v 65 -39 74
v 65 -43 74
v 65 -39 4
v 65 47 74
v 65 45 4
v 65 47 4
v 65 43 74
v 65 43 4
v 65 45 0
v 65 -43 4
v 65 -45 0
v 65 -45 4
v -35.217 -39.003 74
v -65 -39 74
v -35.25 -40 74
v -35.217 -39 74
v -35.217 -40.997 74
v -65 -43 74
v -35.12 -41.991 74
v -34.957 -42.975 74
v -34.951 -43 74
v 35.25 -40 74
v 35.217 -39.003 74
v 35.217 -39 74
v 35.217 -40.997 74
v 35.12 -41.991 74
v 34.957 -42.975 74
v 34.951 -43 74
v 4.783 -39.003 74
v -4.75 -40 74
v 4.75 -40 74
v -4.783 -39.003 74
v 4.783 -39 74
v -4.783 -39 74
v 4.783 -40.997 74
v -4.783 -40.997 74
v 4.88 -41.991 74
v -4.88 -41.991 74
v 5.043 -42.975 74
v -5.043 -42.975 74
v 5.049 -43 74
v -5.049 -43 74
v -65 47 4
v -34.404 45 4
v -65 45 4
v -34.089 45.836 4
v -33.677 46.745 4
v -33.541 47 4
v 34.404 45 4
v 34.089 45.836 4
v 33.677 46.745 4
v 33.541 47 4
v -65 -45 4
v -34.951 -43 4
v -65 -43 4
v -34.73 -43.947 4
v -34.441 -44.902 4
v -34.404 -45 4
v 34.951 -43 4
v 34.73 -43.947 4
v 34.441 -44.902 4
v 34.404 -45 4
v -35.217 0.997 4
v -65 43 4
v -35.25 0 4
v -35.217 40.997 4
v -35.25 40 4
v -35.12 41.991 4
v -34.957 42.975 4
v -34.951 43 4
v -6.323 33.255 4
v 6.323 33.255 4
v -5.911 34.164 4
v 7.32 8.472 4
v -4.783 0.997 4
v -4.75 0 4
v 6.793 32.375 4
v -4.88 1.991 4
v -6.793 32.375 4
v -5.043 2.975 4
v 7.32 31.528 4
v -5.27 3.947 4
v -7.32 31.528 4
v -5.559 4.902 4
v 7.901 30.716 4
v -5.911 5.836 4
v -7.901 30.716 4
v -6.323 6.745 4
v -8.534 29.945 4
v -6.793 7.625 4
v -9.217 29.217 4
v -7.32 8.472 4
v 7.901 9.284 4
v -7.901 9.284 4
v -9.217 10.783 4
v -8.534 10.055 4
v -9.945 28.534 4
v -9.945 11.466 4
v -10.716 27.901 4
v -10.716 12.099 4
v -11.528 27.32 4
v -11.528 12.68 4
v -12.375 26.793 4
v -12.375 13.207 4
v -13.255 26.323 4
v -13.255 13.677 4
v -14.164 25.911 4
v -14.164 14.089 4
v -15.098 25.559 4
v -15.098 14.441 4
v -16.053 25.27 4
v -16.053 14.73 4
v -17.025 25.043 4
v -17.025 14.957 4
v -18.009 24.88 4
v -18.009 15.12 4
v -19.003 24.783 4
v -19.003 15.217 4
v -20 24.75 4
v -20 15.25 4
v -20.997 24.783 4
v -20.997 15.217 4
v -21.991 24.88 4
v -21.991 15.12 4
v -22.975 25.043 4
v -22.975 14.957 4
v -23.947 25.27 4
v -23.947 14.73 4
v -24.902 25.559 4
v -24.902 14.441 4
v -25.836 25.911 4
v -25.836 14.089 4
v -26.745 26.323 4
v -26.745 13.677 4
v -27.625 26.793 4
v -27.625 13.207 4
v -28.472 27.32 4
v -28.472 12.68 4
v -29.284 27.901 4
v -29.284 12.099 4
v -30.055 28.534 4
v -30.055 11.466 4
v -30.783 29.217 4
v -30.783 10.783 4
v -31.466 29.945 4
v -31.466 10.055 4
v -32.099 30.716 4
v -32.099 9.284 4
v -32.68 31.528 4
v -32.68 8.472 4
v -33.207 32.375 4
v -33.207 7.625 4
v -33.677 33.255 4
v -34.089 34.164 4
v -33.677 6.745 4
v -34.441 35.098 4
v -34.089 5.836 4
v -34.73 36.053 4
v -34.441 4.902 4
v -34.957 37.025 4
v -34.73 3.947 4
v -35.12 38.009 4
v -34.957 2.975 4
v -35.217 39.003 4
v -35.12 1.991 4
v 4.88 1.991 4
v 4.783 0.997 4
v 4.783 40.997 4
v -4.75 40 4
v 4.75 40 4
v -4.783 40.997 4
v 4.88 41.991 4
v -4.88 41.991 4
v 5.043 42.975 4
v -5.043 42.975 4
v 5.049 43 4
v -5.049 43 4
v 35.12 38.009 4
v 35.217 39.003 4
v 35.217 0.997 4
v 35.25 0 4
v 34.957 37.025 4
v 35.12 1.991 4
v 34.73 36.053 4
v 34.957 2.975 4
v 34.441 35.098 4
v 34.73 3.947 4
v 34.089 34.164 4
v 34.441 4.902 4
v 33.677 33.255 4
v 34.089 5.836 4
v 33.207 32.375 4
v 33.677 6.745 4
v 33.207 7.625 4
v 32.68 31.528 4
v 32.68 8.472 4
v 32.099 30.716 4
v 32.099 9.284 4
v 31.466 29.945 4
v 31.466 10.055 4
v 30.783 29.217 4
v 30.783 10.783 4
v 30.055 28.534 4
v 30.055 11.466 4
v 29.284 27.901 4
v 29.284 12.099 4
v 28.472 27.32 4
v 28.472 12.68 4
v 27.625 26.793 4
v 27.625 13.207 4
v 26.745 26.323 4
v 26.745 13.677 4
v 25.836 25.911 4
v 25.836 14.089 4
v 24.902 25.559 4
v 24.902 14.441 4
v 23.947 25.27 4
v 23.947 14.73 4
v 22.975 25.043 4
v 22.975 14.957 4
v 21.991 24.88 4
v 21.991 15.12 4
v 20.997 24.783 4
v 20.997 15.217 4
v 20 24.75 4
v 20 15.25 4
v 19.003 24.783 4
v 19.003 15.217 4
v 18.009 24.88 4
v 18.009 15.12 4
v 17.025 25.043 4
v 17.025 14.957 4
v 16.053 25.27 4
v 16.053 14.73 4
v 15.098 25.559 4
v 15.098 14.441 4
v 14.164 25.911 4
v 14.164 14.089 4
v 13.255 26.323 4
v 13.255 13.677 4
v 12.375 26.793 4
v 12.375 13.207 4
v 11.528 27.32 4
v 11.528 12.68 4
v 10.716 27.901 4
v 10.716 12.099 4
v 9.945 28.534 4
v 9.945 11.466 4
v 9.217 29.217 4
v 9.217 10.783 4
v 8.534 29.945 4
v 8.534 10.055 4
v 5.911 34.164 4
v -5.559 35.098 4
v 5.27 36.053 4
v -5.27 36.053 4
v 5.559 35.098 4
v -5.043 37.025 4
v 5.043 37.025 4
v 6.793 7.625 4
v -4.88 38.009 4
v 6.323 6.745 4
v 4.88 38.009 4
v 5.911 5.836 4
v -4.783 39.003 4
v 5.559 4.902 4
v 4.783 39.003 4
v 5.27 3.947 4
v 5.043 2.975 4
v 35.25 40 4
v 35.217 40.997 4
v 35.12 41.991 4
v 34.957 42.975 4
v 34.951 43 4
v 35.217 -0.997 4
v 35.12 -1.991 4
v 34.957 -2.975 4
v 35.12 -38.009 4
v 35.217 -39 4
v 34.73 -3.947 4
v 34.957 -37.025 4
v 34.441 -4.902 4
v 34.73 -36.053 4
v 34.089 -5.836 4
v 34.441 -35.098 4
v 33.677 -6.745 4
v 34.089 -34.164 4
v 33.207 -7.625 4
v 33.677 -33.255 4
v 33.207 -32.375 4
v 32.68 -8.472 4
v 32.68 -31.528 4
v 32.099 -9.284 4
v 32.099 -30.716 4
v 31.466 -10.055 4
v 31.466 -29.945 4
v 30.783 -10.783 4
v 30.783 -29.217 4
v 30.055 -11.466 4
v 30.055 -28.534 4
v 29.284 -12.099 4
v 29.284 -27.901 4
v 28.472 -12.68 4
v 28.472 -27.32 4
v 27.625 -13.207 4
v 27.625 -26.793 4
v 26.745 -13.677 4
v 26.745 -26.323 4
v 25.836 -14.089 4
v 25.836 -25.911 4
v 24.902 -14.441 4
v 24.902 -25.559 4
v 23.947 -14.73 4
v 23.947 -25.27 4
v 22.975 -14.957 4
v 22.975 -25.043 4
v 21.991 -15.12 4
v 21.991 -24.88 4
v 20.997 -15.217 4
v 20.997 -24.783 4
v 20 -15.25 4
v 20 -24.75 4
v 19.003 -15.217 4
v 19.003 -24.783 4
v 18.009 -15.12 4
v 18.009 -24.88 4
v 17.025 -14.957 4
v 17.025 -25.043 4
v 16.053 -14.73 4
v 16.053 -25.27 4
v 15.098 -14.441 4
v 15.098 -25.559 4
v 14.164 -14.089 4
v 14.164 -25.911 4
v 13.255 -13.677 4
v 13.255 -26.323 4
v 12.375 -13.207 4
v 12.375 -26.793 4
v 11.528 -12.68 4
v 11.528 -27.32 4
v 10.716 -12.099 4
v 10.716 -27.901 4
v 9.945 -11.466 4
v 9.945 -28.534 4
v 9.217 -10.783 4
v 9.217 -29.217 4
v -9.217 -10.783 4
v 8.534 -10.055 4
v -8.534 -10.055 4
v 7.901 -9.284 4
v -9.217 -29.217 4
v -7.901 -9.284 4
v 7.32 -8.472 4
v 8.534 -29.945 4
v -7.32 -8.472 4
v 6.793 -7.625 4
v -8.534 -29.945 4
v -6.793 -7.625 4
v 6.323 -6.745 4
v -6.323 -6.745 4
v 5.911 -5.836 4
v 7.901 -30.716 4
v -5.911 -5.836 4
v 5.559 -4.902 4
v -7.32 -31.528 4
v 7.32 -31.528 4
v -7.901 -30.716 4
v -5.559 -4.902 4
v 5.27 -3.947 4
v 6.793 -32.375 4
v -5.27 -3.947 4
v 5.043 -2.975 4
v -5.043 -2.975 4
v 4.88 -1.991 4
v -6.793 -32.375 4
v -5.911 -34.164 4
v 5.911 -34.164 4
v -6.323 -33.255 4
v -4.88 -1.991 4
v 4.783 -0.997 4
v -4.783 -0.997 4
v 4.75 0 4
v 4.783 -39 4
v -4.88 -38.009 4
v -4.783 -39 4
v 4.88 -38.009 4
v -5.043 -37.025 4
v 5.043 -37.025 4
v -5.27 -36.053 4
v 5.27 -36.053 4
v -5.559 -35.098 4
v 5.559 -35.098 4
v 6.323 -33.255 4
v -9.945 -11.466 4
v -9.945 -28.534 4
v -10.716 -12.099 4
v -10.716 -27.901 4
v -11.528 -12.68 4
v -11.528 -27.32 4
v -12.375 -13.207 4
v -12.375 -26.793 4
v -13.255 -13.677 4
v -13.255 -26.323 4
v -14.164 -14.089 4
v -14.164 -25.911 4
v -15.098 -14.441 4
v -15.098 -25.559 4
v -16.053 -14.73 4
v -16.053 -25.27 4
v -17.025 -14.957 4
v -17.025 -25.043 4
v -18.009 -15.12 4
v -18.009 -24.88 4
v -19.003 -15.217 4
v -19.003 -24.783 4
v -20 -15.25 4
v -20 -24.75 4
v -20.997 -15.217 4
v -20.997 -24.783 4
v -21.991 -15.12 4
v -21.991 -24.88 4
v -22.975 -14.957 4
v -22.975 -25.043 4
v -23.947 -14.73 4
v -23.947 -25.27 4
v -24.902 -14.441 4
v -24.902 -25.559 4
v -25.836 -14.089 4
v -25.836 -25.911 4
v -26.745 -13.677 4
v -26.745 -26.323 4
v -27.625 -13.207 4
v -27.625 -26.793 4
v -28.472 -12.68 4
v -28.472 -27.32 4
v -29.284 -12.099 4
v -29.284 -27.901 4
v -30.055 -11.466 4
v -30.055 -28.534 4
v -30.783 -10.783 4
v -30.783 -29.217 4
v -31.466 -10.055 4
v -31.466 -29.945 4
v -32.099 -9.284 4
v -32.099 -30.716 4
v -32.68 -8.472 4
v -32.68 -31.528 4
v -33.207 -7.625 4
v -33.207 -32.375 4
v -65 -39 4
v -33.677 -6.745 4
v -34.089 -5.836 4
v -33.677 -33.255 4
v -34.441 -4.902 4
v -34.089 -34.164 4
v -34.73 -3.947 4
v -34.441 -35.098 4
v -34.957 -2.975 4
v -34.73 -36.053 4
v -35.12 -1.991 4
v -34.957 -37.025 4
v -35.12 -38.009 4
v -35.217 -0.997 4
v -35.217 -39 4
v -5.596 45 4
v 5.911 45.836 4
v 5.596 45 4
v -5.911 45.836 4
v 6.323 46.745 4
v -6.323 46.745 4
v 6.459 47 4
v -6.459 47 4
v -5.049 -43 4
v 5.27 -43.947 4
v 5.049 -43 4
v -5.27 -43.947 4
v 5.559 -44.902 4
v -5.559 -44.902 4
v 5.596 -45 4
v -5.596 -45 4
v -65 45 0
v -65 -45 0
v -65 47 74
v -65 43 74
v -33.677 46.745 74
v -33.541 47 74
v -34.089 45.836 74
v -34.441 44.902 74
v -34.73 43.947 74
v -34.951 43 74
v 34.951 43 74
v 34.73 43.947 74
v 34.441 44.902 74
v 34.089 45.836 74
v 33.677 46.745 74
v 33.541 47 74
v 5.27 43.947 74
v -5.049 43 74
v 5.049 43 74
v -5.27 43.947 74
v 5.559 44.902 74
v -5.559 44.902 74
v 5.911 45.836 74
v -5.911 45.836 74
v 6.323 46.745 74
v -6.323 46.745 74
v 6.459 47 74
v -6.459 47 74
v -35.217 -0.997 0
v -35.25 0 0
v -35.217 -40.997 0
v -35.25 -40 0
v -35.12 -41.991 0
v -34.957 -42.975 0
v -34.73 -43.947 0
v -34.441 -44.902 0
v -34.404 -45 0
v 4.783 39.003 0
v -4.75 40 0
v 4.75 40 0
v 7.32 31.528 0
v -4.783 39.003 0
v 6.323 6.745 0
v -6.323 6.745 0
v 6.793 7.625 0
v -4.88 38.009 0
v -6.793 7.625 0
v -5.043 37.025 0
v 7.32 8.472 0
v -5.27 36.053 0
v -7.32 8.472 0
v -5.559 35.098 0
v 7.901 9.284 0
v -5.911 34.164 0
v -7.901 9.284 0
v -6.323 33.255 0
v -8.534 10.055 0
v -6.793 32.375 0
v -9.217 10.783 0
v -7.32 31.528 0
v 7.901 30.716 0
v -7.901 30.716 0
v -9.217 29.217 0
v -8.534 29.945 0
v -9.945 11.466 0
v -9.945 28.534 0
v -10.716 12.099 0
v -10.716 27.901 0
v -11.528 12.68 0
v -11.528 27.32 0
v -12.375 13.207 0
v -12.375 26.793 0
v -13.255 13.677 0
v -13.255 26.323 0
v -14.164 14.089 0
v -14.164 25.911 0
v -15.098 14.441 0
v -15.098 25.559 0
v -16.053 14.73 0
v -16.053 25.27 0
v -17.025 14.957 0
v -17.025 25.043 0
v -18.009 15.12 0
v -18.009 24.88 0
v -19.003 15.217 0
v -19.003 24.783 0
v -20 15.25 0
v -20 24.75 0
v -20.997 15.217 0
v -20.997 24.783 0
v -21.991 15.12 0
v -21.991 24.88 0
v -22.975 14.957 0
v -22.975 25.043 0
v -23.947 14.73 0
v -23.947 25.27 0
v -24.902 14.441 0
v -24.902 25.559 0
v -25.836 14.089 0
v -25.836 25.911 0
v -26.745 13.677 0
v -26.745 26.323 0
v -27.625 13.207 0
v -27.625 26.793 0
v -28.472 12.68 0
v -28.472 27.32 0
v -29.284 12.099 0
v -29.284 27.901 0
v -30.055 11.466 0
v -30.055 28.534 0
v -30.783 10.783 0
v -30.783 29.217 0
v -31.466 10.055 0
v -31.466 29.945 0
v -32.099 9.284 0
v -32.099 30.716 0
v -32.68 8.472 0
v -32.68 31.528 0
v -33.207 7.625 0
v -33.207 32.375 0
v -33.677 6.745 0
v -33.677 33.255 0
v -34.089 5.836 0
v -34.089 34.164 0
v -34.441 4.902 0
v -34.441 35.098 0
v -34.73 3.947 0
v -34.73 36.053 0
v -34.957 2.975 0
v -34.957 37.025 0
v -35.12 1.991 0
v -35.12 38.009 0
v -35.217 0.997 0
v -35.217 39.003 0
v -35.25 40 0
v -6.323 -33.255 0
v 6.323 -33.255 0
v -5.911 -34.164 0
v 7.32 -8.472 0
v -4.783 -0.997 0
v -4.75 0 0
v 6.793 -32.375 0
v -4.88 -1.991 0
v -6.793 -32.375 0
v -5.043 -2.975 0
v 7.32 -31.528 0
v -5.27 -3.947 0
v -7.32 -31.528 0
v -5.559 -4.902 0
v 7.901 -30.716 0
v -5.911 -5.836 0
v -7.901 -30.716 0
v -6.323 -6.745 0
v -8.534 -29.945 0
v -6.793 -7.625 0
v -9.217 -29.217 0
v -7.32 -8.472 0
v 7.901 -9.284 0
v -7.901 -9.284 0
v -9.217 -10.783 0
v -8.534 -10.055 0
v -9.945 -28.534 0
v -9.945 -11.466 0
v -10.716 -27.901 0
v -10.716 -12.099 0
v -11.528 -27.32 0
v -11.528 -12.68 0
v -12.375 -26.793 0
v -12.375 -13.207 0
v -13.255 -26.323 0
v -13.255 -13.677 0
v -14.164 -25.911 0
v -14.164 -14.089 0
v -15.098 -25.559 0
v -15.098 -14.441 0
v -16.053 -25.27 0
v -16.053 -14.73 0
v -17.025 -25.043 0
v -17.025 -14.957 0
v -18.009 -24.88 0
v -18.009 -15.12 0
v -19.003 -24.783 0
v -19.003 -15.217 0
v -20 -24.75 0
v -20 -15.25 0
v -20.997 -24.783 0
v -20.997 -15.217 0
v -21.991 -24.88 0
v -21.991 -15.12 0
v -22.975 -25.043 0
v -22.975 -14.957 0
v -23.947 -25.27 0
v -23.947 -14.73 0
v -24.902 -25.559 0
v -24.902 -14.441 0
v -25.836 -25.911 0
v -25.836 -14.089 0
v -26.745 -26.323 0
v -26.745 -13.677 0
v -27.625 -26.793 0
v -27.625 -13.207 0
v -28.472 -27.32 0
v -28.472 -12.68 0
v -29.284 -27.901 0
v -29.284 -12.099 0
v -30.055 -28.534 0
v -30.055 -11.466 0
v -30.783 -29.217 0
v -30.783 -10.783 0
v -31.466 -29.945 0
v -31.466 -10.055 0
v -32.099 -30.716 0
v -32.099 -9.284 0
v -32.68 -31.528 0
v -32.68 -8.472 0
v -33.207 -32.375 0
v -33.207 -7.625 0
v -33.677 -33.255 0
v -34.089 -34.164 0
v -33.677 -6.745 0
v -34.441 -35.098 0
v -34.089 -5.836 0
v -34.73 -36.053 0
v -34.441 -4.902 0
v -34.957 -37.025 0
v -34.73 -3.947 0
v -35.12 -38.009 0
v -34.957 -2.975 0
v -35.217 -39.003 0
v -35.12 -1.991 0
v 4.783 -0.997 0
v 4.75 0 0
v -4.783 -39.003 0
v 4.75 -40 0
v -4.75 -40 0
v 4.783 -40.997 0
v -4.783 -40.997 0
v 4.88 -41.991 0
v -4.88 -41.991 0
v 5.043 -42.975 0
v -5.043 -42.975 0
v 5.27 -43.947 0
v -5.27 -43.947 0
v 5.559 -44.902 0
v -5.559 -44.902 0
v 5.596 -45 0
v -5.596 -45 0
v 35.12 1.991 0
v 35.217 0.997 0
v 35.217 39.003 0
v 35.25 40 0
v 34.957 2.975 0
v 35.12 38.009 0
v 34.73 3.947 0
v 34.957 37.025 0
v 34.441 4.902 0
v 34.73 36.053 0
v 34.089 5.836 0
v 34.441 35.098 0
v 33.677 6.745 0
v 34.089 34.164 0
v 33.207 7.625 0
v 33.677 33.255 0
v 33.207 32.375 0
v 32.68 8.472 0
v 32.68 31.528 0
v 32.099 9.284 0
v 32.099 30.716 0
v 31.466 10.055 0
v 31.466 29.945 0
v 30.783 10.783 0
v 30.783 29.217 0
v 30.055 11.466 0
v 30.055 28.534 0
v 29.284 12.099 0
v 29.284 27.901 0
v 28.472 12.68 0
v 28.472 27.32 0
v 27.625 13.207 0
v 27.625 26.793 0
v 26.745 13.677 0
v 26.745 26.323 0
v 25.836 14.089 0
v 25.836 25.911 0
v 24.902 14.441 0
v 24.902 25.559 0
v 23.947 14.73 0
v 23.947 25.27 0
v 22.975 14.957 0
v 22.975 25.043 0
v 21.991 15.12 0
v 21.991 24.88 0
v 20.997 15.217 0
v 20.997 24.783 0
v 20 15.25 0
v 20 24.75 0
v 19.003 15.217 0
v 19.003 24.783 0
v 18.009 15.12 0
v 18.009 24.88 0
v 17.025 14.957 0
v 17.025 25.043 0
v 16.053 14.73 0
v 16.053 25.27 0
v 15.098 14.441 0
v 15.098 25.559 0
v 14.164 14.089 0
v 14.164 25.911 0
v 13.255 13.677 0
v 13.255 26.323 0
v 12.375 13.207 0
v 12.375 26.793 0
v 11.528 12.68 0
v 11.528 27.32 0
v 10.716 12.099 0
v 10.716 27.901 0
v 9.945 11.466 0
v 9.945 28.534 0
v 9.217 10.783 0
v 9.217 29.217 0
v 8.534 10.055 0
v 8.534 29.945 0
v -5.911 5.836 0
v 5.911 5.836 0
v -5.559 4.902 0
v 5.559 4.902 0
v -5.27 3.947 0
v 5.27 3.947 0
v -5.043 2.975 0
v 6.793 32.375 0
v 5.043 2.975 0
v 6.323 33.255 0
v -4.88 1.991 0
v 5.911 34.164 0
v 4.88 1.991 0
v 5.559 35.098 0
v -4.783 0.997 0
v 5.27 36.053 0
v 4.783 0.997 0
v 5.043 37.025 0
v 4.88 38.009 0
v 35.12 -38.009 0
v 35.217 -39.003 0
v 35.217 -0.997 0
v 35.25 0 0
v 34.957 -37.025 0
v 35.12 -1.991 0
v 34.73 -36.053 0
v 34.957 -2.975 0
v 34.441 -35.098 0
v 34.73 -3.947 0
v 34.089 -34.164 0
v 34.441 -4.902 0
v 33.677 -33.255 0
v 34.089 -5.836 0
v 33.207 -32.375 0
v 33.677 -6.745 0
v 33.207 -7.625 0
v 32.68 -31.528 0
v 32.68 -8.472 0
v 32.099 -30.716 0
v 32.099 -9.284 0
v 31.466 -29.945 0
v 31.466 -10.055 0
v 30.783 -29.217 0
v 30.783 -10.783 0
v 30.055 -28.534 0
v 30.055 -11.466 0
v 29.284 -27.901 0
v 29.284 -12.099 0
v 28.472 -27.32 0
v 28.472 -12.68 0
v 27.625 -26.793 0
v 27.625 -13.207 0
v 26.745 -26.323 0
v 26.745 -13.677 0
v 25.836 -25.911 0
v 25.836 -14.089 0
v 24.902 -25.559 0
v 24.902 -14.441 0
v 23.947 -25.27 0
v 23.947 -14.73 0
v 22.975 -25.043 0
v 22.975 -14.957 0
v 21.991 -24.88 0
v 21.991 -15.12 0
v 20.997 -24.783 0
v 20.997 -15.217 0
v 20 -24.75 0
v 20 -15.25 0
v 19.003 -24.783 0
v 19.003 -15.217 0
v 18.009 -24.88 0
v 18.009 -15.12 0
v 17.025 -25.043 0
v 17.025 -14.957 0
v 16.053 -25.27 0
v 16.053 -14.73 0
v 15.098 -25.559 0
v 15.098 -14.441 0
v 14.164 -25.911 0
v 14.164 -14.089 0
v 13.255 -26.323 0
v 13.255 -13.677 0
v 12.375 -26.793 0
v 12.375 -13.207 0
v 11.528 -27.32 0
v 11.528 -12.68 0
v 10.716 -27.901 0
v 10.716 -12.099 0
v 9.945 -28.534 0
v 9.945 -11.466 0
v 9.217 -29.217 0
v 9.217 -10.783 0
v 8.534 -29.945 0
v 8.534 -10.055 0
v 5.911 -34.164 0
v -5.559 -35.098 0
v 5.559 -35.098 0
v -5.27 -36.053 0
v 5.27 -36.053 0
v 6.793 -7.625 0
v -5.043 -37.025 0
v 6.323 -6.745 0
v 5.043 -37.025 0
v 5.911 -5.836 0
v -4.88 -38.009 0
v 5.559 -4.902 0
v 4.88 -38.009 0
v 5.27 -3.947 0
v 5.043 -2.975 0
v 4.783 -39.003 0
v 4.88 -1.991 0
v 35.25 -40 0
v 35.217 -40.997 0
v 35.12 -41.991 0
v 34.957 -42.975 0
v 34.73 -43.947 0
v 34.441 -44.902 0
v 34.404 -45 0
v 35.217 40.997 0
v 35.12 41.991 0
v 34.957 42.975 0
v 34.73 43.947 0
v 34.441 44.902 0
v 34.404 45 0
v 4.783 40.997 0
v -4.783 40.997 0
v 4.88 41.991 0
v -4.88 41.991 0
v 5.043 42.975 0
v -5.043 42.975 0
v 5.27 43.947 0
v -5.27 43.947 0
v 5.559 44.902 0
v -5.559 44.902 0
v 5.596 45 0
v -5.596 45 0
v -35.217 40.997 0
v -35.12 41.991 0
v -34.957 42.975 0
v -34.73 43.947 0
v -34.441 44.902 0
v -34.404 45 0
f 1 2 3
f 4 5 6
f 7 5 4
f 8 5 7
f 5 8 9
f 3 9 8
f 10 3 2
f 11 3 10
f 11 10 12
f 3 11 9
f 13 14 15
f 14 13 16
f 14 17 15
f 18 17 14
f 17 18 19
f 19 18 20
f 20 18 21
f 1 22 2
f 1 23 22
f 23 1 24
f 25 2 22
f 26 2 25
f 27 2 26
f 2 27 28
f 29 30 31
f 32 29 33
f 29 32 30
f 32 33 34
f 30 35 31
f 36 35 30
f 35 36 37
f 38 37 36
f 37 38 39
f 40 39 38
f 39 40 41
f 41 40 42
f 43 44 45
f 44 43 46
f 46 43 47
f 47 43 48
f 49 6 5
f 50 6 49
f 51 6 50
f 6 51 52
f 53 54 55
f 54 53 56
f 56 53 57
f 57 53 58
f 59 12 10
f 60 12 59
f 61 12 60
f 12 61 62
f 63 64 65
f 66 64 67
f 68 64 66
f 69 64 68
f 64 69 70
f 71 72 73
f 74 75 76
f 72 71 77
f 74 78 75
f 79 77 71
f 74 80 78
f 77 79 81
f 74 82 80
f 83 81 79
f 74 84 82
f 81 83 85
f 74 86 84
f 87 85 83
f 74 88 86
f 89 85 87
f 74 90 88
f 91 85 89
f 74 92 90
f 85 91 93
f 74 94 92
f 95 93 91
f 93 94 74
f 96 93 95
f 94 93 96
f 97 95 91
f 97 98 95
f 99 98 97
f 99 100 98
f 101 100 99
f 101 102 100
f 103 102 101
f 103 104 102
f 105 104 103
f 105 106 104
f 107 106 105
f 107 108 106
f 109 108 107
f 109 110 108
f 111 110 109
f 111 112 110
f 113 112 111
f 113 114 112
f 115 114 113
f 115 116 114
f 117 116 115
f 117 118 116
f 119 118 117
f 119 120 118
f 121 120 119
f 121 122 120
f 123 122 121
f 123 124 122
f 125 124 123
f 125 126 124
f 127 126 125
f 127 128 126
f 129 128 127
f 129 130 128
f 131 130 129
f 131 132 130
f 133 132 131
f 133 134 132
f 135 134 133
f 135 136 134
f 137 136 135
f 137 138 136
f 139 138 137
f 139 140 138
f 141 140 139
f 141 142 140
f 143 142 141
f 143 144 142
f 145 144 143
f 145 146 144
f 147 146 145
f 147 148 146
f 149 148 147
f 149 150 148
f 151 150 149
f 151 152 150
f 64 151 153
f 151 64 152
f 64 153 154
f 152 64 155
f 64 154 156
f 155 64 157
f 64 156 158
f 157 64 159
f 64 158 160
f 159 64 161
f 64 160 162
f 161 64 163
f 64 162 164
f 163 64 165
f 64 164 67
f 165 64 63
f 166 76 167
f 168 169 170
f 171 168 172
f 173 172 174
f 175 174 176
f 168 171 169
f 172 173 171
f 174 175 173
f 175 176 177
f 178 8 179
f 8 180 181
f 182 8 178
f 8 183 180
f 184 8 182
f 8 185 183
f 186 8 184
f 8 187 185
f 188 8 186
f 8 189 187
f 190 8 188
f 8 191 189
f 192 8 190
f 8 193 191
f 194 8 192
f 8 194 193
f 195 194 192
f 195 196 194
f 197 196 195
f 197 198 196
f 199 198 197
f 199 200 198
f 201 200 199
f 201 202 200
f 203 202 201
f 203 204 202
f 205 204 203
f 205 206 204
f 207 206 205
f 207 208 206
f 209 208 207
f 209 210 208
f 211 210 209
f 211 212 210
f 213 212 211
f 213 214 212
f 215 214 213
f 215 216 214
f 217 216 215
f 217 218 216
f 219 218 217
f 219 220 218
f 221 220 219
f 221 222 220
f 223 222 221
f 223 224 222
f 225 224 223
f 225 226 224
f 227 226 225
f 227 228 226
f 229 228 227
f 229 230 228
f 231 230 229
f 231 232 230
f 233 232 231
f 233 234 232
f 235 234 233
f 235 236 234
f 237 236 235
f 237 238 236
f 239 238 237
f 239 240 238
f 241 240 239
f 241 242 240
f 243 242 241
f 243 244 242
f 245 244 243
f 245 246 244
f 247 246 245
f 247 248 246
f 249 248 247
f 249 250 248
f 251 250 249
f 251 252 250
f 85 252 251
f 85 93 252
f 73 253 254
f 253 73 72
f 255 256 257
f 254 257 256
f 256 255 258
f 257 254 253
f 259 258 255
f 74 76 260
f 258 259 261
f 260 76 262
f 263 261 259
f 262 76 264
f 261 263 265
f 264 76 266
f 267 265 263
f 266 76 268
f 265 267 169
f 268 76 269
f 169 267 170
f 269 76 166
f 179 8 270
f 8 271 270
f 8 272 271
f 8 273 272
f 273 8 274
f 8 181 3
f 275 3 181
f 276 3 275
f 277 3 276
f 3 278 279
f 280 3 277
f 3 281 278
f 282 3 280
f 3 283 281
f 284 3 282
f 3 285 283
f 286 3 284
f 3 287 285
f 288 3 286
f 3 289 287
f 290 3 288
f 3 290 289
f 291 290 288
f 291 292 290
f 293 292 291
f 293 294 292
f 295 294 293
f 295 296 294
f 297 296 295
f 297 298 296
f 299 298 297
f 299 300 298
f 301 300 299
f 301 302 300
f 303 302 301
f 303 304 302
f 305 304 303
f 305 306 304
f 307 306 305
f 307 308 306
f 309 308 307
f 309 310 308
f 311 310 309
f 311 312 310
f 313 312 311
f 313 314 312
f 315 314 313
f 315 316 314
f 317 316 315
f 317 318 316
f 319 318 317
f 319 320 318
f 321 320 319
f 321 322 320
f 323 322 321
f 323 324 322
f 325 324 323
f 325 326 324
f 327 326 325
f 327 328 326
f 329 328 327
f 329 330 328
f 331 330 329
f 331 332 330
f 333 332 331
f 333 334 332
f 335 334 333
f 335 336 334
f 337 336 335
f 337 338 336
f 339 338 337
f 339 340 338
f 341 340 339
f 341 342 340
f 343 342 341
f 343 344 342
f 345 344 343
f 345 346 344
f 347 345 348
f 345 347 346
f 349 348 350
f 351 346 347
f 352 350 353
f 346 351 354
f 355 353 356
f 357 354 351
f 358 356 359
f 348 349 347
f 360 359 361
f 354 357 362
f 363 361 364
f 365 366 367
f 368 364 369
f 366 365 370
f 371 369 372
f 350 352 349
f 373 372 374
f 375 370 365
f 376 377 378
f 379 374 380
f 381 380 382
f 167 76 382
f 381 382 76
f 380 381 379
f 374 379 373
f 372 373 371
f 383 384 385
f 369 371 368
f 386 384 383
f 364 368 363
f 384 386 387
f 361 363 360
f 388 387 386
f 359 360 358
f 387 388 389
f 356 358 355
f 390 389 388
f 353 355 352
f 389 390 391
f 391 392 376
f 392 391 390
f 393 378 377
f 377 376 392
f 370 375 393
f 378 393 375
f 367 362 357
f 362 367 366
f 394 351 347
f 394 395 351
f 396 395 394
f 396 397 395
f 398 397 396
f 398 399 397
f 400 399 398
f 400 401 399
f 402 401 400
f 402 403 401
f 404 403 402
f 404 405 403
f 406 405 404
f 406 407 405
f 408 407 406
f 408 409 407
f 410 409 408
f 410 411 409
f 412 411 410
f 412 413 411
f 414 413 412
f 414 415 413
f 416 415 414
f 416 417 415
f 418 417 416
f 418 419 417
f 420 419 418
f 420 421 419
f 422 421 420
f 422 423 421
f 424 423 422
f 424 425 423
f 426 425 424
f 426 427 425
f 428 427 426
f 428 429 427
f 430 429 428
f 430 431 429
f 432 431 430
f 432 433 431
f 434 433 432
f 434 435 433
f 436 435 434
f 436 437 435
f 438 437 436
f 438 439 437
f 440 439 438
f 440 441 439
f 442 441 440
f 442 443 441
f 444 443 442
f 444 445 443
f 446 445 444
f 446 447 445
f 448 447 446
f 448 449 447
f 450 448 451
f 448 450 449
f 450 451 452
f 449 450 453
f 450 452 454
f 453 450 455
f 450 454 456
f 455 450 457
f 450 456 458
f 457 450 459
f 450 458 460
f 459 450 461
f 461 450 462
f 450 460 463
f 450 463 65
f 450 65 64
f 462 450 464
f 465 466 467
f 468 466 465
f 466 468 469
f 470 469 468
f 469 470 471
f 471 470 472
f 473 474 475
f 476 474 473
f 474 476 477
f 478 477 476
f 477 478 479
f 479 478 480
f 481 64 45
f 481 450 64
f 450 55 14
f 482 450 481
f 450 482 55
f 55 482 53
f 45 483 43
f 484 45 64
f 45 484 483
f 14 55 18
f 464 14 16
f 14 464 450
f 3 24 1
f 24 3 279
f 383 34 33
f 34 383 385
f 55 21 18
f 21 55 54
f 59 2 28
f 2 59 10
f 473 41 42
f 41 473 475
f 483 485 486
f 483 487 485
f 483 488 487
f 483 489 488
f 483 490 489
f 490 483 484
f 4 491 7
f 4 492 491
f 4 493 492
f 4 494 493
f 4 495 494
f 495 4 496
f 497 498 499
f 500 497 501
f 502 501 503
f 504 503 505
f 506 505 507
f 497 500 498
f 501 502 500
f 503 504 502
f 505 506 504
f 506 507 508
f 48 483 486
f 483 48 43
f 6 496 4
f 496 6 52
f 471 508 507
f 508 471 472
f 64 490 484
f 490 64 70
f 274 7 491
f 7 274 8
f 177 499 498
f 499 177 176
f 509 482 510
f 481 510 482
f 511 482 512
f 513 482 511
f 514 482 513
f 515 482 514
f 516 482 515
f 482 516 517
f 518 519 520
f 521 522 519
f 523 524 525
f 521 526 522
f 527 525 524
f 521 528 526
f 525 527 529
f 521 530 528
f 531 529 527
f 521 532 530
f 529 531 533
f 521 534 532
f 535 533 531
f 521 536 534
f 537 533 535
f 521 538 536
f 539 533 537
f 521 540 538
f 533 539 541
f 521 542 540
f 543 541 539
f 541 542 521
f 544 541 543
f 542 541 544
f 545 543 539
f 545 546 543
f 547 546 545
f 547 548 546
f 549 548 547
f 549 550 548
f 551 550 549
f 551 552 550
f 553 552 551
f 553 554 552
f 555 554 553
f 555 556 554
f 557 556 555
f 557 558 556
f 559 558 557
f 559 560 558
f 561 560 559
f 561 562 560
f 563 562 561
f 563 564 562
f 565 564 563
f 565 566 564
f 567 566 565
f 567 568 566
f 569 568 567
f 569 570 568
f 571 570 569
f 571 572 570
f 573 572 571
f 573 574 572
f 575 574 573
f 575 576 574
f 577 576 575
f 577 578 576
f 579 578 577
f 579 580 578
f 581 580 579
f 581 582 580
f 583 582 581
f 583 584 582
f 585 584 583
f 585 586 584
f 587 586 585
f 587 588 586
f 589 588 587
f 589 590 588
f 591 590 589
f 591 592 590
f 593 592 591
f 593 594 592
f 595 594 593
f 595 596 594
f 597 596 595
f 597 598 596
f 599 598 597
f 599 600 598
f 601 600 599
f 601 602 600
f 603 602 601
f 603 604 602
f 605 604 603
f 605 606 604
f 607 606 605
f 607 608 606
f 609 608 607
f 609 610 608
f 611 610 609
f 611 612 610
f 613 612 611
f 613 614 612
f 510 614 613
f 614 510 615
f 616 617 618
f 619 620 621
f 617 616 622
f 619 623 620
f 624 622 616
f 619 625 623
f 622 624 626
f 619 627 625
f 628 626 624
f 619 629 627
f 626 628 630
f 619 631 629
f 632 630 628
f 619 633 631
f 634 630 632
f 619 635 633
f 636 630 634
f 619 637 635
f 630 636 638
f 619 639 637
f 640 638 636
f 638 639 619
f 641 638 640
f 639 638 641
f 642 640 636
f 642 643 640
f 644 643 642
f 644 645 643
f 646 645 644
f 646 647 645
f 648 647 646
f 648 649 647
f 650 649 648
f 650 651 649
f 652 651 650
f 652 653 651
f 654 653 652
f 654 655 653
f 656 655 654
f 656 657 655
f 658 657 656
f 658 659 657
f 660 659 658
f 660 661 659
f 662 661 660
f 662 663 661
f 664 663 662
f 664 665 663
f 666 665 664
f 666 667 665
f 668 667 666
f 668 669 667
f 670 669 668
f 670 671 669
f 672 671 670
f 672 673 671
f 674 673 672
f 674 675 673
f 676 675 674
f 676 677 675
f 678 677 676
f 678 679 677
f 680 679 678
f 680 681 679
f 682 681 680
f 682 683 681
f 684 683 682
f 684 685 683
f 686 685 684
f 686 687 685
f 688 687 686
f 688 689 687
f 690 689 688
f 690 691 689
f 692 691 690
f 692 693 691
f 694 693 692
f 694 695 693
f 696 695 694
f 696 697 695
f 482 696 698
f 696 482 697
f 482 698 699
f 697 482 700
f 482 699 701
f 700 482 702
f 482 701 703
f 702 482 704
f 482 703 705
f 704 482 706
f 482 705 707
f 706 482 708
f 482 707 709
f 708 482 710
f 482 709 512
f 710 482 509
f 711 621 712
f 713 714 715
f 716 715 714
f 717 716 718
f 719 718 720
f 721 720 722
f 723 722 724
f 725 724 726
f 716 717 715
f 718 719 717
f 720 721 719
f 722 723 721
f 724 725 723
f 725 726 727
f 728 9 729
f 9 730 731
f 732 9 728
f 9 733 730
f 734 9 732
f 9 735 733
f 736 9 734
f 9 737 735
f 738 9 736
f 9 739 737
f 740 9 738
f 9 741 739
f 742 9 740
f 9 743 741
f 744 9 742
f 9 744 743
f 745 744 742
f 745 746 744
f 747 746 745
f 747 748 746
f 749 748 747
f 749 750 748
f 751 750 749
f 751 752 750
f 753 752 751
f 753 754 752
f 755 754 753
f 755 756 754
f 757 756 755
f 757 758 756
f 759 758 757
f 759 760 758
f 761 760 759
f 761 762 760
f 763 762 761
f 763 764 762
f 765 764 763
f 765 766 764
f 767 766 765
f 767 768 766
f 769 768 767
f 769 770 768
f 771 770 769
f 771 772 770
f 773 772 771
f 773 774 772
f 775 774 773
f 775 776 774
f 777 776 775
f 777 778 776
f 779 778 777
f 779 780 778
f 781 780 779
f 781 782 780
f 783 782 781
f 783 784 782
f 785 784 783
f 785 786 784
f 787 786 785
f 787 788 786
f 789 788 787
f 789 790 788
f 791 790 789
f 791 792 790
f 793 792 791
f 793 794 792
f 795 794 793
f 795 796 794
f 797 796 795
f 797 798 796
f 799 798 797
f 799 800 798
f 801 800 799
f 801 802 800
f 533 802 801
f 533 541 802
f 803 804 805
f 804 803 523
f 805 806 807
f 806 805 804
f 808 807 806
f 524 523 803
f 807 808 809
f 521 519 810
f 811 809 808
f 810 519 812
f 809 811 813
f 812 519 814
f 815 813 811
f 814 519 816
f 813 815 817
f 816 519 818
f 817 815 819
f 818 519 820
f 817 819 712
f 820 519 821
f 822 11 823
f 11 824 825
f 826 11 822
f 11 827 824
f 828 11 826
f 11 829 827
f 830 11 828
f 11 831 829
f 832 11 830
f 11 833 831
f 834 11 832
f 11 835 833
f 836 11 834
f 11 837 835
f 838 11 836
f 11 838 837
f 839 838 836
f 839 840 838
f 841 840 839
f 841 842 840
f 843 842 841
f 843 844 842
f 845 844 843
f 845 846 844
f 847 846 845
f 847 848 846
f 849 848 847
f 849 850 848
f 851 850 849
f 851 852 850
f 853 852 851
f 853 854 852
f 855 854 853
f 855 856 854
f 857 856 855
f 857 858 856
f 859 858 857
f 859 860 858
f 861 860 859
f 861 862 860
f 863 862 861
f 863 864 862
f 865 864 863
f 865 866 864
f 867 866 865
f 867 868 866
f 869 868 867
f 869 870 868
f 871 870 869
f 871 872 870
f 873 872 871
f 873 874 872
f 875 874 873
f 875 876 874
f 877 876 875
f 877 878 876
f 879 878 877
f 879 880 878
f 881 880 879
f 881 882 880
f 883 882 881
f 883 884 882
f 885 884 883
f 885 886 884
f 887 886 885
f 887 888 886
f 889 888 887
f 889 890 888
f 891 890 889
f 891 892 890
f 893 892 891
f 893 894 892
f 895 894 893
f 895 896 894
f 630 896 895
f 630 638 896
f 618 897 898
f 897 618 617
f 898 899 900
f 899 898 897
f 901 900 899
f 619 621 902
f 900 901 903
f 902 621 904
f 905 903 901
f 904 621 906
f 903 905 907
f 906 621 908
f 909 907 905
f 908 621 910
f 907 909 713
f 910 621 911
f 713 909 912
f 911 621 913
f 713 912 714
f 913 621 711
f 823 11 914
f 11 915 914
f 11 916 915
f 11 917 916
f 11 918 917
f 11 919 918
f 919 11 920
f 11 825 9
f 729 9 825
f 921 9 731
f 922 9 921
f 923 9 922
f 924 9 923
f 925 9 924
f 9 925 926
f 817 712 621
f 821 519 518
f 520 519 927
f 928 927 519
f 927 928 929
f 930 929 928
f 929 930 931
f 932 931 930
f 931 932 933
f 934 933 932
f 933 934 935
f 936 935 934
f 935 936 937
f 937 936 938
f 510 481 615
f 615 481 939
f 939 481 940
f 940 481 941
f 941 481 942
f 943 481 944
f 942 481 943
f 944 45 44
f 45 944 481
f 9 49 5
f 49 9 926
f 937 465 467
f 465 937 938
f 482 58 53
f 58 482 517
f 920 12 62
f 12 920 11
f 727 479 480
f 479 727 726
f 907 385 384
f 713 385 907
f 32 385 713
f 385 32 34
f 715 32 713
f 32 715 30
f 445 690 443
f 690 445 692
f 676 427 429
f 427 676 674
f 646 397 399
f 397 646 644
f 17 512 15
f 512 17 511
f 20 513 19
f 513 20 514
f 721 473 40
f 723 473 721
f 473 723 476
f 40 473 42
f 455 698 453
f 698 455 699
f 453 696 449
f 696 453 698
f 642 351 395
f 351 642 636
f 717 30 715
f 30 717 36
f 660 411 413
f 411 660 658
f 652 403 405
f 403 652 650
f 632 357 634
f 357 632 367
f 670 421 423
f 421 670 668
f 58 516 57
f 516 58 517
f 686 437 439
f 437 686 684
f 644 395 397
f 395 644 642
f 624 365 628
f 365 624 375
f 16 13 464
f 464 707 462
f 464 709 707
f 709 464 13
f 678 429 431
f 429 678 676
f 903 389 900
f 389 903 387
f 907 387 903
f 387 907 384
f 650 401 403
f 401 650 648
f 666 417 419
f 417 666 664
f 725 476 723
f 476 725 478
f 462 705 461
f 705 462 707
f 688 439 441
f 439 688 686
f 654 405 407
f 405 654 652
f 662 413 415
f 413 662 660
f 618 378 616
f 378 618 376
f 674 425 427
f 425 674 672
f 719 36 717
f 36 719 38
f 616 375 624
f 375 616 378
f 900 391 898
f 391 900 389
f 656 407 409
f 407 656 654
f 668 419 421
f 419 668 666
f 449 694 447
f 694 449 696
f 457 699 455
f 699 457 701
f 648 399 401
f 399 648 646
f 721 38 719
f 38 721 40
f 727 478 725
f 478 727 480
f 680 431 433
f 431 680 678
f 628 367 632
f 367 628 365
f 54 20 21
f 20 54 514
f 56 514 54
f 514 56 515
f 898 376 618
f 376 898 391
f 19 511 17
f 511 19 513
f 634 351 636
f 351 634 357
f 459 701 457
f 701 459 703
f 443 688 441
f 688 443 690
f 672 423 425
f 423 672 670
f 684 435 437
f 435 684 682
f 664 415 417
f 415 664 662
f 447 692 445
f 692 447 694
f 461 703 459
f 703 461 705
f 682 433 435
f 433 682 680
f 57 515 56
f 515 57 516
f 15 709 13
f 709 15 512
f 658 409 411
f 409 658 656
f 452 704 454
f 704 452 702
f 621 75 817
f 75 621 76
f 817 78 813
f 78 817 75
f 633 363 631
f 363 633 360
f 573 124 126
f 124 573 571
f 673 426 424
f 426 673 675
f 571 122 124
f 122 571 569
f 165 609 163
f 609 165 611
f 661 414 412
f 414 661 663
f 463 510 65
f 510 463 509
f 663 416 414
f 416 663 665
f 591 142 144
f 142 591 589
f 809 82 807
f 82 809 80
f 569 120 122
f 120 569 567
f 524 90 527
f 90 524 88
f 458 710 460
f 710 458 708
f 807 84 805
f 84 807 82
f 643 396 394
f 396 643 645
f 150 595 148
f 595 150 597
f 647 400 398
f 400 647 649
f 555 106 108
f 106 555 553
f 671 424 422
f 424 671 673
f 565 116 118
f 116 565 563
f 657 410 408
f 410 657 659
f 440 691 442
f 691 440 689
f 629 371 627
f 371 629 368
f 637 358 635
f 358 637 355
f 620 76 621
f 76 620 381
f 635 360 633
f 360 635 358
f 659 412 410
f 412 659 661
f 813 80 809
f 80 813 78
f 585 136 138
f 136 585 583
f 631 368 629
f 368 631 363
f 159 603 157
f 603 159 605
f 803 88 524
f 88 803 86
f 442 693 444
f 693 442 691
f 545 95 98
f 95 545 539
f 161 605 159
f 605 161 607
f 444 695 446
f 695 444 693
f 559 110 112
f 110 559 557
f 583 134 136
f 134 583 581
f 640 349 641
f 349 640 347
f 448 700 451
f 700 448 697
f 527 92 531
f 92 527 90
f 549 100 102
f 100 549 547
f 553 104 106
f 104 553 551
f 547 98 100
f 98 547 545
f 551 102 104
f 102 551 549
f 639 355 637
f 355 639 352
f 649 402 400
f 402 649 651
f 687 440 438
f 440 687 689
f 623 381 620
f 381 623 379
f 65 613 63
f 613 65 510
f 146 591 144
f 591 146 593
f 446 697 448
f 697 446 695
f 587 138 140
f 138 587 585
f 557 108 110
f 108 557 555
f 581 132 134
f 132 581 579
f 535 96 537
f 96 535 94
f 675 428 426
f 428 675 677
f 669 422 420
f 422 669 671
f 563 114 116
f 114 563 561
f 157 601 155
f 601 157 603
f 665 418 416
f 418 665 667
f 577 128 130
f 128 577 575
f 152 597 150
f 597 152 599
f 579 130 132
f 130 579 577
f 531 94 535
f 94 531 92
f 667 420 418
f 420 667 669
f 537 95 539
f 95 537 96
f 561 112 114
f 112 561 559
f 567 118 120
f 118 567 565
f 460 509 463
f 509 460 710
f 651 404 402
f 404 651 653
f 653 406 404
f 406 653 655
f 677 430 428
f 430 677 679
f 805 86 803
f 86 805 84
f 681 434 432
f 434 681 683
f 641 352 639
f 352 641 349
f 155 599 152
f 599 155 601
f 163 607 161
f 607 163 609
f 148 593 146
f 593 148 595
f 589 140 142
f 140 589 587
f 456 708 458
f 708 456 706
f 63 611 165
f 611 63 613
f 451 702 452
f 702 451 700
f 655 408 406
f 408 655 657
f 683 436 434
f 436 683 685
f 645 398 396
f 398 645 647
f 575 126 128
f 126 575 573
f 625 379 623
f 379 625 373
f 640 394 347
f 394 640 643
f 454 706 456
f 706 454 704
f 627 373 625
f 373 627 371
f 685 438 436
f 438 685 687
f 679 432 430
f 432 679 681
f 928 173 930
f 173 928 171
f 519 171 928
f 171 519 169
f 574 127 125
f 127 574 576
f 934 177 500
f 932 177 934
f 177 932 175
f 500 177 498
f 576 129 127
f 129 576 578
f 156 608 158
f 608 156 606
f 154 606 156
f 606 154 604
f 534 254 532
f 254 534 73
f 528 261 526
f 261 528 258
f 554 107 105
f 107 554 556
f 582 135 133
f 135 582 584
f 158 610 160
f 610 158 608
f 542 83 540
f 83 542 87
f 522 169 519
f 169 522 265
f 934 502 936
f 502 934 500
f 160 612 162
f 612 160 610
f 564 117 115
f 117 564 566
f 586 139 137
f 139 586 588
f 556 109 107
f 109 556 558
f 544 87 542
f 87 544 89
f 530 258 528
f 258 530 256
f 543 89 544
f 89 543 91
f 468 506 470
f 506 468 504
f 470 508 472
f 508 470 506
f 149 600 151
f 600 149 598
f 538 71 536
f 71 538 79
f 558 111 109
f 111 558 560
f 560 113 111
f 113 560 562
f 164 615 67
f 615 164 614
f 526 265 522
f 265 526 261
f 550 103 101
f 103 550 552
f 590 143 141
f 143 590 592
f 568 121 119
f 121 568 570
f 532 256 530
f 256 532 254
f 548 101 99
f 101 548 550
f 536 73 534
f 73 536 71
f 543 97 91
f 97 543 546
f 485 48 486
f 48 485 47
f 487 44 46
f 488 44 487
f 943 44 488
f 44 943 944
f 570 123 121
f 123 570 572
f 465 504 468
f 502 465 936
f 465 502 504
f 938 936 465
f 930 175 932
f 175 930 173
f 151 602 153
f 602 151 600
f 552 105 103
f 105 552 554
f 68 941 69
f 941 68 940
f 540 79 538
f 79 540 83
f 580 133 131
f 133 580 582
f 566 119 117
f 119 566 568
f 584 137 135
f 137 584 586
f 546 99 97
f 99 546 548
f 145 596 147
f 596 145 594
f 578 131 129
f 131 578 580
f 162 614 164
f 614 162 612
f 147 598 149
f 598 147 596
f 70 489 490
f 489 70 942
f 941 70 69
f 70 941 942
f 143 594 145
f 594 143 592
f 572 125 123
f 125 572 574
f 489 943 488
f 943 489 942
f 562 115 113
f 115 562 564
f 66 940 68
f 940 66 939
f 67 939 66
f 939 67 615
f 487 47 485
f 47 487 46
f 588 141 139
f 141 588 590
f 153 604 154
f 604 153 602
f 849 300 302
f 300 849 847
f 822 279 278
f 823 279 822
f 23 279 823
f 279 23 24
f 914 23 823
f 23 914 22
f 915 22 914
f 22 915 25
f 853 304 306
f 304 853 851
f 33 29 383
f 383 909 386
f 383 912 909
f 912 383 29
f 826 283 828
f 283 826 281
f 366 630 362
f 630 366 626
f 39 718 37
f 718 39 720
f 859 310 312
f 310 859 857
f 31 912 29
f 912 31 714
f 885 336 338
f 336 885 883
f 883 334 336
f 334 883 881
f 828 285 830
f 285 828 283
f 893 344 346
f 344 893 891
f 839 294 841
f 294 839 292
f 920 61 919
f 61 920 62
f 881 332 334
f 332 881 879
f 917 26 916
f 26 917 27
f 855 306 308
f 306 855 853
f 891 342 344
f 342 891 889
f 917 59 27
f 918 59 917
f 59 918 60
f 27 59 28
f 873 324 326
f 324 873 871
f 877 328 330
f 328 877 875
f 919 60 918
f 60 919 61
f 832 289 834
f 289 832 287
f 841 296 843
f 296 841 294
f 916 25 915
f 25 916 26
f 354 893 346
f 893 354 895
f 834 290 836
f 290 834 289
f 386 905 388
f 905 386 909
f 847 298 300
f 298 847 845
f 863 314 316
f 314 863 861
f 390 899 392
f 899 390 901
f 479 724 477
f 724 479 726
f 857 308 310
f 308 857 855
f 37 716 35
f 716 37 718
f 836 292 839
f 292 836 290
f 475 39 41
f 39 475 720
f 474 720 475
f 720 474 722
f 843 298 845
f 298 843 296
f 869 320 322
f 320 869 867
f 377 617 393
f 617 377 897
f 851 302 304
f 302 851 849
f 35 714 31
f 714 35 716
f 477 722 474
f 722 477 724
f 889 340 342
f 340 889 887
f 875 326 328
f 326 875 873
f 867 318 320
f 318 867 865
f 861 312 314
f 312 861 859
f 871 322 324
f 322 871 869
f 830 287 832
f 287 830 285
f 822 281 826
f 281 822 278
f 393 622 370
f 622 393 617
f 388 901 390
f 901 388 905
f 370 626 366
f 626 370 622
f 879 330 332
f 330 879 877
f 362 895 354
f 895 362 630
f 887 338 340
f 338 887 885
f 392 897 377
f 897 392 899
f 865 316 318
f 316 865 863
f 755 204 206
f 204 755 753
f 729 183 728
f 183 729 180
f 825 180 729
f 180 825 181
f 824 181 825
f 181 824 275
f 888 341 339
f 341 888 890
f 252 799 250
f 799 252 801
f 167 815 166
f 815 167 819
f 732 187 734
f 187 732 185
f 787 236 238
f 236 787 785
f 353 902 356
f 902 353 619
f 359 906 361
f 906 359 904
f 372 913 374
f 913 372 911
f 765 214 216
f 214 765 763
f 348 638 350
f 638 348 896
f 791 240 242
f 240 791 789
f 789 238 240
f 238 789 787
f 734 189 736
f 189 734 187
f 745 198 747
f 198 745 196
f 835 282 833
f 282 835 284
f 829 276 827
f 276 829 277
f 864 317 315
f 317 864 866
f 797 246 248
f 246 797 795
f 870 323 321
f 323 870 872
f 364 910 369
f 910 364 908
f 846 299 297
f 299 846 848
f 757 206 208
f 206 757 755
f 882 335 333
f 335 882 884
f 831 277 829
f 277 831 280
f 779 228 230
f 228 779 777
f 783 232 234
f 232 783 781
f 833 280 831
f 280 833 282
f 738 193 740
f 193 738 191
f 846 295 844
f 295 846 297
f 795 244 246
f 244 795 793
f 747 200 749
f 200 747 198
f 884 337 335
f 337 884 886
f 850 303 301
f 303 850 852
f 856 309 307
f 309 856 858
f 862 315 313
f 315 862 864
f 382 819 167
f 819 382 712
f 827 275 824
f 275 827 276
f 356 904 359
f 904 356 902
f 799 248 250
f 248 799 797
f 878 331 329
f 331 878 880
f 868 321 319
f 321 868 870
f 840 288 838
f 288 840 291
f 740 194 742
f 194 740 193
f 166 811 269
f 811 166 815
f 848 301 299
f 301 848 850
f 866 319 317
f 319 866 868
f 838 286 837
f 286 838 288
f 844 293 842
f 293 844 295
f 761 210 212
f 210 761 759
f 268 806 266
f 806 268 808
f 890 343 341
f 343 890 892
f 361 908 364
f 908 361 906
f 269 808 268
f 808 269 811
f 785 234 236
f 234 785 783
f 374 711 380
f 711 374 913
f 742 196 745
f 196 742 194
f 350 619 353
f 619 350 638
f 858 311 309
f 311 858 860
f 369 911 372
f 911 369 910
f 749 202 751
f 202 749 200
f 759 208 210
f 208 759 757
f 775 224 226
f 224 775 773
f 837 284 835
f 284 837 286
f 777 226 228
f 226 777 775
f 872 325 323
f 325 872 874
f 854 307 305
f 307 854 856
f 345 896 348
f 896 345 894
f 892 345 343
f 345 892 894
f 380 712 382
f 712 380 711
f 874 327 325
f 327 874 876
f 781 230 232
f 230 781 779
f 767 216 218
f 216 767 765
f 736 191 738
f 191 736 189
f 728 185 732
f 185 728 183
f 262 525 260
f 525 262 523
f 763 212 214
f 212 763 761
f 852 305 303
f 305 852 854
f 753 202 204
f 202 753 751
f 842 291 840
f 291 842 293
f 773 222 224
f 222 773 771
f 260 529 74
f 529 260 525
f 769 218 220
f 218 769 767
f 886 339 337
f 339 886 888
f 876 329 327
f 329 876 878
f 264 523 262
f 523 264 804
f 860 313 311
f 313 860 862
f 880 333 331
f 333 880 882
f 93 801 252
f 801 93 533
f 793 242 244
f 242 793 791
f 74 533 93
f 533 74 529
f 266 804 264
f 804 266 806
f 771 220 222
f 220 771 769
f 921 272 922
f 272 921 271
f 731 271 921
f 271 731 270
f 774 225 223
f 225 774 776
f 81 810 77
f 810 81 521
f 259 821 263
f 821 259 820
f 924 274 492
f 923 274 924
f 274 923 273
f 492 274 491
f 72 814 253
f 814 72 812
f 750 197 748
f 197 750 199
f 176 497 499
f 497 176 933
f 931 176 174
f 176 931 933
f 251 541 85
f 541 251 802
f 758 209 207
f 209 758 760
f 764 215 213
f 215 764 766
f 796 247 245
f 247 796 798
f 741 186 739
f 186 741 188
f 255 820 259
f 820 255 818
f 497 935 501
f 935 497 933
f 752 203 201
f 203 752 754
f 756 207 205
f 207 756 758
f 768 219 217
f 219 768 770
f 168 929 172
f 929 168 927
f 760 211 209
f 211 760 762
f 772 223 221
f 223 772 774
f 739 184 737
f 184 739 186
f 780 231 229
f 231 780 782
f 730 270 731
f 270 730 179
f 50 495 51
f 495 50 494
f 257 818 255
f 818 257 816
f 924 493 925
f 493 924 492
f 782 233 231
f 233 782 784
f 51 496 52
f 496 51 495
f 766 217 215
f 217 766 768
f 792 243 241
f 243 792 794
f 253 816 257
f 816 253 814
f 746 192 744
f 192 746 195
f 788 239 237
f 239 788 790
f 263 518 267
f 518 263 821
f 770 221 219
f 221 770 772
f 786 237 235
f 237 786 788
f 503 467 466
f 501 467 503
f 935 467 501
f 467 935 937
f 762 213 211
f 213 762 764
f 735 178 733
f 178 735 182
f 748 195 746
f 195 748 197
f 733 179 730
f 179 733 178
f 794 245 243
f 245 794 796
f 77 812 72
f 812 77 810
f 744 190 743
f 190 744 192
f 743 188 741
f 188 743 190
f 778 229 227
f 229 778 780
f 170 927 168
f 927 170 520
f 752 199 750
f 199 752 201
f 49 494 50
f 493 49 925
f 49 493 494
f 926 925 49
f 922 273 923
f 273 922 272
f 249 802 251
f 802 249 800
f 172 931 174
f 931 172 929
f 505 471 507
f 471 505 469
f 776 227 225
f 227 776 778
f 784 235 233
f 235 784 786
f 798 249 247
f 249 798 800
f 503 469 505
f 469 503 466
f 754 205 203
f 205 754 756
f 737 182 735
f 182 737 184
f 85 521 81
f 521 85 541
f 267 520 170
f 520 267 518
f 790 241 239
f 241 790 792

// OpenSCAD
// Rack for six 50 mL conical (Falcon-type) tubes
// Printed upside down: plate on bed, walls rising from plate edges.
// Flipped over after printing: rack stands on walls, tubes pass through holes.

// ---------------- Parameters ----------------
plate_x      = 130;    // plate length along X (mm)
plate_y      = 90;     // plate width along Y (mm)
plate_t      = 4;      // plate thickness along Z (mm)

hole_count   = 6;      // number of tube holes (2 rows x 3 cols)
hole_d       = 30.5;   // tube hole diameter (mm)
hole_pitch   = 40;     // centre-to-centre spacing, both directions (mm)

wall_t       = 4;      // wall thickness along Y (mm)
wall_top_z   = 70;     // total height of walls above plate (z = plate_t + 70)

eps          = 0.5;    // cutter overshoot past faces (mm)
$fn          = 96;     // circle resolution

// ---------------- Derived ----------------
rows         = hole_count / 2;                 // 2 rows along Y
cols         = hole_count / rows;              // 3 cols along X
plate_h      = plate_t + wall_top_z;           // overall plate height (74)

// ---------------- Model ----------------
difference() {
    union() {
        // Flat plate on the bed
        translate([-plate_x / 2, -plate_y / 2, 0])
            cube([plate_x, plate_y, plate_t]);

        // Two solid walls along the long edges, rising from plate to z = 70
        for (edge = [-1, 1])
            translate([-plate_x / 2, edge * (plate_y / 2 - wall_t / 2), plate_t])
                cube([plate_x, wall_t, wall_top_z]);
    }

    // Tube holes: 2 rows (along Y) of 3 (along X), centred on plate
    for (i = [0 : cols - 1], j = [0 : rows - 1])
        translate([(i - (cols - 1) / 2) * hole_pitch,
                   (j - (rows - 1) / 2) * hole_pitch,
                   -eps])
            cylinder(d = hole_d, h = plate_h + 2 * eps);
}
